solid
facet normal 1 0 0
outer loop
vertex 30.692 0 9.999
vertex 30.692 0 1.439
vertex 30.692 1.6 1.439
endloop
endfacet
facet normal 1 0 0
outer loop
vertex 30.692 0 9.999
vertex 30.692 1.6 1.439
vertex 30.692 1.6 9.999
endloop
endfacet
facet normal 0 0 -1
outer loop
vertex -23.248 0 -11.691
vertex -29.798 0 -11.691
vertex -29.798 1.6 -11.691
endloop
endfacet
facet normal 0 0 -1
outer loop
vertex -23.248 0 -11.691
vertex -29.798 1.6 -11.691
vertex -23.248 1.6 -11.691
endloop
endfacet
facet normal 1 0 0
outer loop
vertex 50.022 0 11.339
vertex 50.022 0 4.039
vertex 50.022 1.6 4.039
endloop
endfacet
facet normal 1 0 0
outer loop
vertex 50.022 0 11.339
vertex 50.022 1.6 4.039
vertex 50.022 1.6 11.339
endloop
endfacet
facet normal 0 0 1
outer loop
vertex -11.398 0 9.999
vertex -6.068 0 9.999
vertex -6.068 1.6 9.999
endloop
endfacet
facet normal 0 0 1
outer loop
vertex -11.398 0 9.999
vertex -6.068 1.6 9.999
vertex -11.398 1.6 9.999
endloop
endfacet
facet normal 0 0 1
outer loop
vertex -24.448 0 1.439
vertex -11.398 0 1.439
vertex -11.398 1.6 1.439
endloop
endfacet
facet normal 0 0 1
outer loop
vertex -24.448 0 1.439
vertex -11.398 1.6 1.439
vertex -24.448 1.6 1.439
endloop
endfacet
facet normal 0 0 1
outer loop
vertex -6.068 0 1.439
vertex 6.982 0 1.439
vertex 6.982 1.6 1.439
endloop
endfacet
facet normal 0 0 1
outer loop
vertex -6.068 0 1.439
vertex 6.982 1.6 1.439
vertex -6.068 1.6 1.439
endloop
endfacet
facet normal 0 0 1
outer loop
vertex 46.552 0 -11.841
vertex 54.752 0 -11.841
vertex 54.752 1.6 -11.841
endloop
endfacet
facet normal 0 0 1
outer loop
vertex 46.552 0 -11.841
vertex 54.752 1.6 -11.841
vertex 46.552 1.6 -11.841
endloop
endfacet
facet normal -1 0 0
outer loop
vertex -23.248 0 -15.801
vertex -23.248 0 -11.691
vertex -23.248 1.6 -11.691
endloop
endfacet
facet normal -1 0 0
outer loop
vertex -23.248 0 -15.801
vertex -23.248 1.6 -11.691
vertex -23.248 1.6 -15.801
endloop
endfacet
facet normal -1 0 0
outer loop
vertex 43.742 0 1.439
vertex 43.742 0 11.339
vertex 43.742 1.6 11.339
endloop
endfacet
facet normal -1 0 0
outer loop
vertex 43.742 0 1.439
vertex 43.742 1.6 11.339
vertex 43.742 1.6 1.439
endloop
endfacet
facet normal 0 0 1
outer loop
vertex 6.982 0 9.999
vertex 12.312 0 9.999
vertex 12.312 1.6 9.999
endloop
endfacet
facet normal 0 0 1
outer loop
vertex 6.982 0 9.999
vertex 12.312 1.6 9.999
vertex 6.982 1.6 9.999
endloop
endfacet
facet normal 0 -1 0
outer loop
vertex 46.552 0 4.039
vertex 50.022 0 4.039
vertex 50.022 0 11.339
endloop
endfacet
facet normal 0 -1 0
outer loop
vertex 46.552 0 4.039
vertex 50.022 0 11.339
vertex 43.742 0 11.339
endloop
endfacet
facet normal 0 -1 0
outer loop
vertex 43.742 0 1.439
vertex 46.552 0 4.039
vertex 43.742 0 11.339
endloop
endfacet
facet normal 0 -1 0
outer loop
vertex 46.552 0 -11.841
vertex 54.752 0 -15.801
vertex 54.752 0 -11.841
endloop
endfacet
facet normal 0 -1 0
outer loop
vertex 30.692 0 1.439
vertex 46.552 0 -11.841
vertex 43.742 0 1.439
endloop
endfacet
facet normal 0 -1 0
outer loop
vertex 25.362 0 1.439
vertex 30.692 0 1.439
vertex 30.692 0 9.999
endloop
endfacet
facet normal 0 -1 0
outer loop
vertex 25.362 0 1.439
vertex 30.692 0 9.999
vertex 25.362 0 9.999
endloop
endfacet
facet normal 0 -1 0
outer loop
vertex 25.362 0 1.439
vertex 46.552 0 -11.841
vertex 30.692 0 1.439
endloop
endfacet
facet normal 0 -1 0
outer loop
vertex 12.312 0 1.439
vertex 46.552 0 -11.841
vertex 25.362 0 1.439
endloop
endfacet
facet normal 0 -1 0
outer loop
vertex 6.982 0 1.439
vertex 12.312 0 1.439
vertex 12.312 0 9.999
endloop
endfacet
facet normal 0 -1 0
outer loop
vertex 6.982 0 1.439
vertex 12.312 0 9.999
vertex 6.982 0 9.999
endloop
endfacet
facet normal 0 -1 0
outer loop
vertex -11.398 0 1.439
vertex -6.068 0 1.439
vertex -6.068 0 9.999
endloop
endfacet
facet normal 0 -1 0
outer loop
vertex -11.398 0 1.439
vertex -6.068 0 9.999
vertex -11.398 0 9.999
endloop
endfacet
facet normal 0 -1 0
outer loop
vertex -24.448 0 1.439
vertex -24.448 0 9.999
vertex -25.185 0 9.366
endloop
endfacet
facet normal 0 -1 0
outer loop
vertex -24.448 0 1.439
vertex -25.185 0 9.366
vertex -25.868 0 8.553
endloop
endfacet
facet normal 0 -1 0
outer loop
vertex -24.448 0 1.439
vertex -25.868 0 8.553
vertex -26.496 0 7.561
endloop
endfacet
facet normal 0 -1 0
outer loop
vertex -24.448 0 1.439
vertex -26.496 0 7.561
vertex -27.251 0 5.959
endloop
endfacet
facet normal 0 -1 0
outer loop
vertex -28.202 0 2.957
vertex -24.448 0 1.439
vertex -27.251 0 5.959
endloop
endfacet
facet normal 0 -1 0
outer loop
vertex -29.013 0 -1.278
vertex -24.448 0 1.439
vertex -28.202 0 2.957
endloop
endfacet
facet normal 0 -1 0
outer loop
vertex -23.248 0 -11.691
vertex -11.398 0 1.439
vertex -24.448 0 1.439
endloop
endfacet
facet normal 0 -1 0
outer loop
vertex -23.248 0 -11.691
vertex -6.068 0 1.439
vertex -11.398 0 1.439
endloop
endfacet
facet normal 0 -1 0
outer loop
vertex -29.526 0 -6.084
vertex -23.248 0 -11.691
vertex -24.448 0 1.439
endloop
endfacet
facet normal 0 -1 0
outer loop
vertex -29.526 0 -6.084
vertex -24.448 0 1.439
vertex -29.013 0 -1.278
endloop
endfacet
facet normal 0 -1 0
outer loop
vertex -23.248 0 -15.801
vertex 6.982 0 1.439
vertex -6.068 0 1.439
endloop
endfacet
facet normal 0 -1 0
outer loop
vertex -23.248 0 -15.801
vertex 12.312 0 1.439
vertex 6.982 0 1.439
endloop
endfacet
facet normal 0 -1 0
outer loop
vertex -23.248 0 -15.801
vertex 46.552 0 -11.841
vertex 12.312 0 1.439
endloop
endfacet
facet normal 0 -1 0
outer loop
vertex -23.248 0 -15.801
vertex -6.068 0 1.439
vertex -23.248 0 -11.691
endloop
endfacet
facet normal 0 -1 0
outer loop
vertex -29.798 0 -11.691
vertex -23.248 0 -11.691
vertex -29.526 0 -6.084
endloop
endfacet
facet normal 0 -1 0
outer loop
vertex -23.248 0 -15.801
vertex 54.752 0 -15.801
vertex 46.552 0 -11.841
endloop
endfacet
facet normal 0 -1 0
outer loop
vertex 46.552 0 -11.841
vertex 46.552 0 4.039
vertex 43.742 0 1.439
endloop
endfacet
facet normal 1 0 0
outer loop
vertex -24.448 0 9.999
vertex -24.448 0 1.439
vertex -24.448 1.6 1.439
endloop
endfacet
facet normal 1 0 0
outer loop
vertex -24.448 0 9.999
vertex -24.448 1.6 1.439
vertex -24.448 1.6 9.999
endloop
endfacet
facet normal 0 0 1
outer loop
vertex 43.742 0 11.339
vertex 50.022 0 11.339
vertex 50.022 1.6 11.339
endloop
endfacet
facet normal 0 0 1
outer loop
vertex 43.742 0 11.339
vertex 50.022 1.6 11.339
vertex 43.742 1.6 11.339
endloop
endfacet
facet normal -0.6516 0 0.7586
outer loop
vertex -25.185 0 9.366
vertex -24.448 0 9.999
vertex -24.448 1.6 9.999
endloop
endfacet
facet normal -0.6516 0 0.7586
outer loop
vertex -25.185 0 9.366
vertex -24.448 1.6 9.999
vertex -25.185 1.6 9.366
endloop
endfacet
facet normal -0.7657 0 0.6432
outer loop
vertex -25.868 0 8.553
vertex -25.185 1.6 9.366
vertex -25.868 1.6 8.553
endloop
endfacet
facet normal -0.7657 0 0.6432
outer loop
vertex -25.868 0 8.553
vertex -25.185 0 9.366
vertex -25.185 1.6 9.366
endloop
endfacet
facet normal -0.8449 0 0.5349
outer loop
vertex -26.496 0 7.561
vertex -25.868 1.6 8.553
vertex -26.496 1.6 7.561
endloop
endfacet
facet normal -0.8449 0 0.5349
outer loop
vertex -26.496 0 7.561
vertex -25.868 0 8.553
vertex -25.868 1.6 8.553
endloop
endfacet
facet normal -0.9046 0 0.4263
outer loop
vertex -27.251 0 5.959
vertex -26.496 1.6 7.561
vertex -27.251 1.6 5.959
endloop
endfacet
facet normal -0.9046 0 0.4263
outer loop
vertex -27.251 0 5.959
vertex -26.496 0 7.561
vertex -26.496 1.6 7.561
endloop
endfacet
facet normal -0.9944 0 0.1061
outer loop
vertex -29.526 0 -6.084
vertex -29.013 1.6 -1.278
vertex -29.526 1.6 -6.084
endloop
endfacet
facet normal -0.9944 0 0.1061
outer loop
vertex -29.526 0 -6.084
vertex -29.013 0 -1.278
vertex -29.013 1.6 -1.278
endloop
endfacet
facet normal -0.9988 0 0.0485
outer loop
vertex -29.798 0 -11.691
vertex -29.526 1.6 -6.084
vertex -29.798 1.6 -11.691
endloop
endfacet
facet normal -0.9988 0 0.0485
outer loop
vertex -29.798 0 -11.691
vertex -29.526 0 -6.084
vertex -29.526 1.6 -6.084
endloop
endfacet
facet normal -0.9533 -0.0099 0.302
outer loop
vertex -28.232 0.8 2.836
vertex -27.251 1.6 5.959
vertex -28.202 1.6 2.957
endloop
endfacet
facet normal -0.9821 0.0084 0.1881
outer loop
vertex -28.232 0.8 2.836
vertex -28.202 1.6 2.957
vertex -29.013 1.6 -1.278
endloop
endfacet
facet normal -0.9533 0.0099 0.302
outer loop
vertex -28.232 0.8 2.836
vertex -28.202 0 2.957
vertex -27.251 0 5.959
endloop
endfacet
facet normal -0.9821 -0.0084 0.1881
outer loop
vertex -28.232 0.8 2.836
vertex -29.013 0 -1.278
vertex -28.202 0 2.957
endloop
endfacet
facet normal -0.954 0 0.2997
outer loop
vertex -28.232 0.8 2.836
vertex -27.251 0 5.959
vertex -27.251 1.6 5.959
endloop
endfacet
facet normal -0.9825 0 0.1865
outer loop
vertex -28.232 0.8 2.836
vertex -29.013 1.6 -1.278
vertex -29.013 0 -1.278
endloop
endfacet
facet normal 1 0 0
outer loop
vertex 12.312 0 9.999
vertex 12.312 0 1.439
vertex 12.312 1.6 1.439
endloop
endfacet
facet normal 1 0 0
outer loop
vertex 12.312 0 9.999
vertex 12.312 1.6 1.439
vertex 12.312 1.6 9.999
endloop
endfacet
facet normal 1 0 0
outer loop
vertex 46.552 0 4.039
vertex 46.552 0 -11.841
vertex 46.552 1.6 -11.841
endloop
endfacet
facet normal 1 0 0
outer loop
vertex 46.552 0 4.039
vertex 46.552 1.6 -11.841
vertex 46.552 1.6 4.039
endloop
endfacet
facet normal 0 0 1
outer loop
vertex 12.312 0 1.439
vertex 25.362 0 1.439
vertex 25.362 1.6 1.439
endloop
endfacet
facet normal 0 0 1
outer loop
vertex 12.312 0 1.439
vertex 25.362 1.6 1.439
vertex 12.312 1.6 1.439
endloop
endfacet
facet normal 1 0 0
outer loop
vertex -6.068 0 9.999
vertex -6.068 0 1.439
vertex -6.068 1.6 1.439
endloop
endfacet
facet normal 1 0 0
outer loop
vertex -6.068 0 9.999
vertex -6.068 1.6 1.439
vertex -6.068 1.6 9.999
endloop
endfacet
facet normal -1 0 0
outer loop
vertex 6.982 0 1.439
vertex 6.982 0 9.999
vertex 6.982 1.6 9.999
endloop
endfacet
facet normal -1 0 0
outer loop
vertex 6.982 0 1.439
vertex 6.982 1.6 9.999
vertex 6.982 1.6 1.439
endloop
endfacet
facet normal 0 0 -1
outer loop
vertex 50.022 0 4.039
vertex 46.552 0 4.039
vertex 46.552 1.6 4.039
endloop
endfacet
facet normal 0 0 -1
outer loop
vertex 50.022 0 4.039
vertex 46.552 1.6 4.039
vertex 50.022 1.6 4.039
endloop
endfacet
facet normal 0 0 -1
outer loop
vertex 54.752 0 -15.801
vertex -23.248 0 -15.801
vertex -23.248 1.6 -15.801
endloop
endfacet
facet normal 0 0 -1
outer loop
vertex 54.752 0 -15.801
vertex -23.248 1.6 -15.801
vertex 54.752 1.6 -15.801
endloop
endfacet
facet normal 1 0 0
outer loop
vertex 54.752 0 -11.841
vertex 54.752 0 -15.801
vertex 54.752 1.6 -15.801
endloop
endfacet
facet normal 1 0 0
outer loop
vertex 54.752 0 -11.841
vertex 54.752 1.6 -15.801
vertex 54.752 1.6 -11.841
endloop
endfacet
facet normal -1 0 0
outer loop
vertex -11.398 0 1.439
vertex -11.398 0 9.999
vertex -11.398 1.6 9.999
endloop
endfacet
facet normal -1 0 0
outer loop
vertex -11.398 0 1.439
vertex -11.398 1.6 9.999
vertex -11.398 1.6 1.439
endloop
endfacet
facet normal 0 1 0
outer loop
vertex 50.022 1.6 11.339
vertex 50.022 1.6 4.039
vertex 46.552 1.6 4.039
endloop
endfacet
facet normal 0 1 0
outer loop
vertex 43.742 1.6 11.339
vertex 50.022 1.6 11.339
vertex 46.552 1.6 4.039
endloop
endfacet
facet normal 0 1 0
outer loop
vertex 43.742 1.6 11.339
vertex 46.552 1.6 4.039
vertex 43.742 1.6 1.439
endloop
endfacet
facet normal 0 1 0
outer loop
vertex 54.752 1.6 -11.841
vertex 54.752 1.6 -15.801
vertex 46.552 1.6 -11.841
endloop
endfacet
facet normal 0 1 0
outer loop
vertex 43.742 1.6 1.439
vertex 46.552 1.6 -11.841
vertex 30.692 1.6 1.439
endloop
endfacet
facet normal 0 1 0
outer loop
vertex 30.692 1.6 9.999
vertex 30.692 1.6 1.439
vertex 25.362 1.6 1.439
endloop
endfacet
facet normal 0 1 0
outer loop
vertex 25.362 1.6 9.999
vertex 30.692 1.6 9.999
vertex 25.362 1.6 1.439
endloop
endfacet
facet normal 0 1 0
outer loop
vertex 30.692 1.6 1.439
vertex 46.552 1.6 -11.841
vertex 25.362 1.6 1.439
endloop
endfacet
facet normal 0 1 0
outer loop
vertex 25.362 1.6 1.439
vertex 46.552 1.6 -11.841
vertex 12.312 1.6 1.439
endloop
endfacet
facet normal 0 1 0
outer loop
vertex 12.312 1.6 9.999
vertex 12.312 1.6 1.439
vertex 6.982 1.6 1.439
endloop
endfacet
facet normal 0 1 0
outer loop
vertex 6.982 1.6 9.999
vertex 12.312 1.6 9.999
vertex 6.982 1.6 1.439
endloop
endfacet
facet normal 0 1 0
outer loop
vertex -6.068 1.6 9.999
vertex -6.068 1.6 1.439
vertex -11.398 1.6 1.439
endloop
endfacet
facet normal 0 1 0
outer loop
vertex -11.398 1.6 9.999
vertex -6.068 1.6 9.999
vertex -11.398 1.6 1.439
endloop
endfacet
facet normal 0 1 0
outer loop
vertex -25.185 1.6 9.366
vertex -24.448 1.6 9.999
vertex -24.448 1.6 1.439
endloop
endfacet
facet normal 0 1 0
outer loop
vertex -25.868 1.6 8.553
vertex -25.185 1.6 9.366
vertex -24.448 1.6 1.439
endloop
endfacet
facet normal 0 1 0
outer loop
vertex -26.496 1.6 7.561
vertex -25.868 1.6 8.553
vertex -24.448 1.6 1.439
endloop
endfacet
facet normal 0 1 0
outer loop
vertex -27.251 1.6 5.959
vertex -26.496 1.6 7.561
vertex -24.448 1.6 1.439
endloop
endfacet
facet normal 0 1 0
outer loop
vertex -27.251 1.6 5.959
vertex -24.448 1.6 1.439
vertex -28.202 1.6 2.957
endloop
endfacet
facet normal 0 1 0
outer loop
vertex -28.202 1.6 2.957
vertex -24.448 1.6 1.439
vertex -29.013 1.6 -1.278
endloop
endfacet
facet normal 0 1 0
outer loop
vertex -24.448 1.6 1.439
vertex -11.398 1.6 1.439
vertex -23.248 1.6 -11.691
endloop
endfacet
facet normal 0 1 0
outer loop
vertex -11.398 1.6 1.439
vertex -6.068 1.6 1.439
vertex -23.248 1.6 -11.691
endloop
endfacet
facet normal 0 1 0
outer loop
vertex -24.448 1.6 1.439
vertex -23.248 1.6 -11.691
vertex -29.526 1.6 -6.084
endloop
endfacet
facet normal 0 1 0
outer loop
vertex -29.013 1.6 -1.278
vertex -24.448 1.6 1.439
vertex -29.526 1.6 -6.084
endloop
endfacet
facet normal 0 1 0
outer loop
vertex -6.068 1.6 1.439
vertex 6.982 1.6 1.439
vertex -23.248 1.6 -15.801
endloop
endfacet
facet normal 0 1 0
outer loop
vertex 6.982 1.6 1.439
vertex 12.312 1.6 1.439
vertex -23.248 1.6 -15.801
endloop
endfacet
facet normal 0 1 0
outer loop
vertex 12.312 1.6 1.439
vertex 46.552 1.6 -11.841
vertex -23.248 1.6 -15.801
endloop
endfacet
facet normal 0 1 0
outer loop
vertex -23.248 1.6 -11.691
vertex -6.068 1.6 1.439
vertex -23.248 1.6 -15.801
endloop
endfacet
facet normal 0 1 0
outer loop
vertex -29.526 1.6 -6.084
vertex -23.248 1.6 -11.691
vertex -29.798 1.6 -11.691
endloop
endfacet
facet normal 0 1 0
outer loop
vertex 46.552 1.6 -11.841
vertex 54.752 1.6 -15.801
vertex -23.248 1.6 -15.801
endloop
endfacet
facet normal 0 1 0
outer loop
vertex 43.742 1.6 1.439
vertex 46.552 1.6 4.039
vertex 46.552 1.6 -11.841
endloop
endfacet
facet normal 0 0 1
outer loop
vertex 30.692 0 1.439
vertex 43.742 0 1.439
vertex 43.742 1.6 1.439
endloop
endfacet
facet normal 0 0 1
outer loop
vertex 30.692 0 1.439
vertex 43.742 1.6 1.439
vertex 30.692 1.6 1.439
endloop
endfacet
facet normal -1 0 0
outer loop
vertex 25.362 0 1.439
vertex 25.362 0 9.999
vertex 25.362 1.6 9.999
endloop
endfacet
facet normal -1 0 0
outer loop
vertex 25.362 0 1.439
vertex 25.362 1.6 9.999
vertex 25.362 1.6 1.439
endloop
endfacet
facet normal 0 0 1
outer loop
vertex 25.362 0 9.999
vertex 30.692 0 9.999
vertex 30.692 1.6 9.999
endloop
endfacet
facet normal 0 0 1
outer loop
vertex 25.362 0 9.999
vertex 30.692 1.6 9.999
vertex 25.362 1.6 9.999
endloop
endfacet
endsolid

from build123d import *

# Parameters (mm, degrees)
BOSS_EXTRUDE1_DEPTH = 1.6


with BuildPart() as part:
    # Sketch1 → Boss-Extrude1 (new body)
    with BuildSketch(Plane(origin=(0, 0, 0), x_dir=(1, 0, 0), z_dir=(0, 1, 0))):
        with BuildLine():
            Line((-23.247910864, 15.801225627), (54.752089136, 15.801225627))
            Line((54.752089136, 15.801225627), (54.752089136, 11.841225627))
            Line((54.752089136, 11.841225627), (46.552089136, 11.841225627))
            Line((46.552089136, 11.841225627), (46.552089136, -4.038774373))
            Line((46.552089136, -4.038774373), (50.022089136, -4.038774373))
            Line((50.022089136, -4.038774373), (50.022089136, -11.338774373))
            Line((50.022089136, -11.338774373), (43.742089136, -11.338774373))
            Line((43.742089136, -11.338774373), (43.742089136, -1.438774373))
            Line((43.742089136, -1.438774373), (30.692089136, -1.438774373))
            Line((30.692089136, -1.438774373), (30.692089136, -9.998774373))
            Line((30.692089136, -9.998774373), (25.362089136, -9.998774373))
            Line((25.362089136, -9.998774373), (25.362089136, -1.438774373))
            Line((25.362089136, -1.438774373), (12.312089136, -1.438774373))
            Line((12.312089136, -1.438774373), (12.312089136, -9.998774373))
            Line((12.312089136, -9.998774373), (6.982089136, -9.998774373))
            Line((6.982089136, -9.998774373), (6.982089136, -1.438774373))
            Line((6.982089136, -1.438774373), (-6.067910864, -1.438774373))
            Line((-6.067910864, -1.438774373), (-6.067910864, -9.998774373))
            Line((-6.067910864, -9.998774373), (-11.397910864, -9.998774373))
            Line((-11.397910864, -9.998774373), (-11.397910864, -1.438774373))
            Line((-11.397910864, -1.438774373), (-24.447910864, -1.438774373))
            Line((-24.447910864, -1.438774373), (-24.447910864, -9.998774373))
            add(Edge.make_bspline(
                [(-24.447910864, -9.998774373), (-29.341121858, -6.518559079), (-29.797910864, 11.691225627)],
                knots=[0, 0, 0, 1, 1, 1], degree=2))
            Line((-29.797910864, 11.691225627), (-23.247910864, 11.691225627))
            Line((-23.247910864, 11.691225627), (-23.247910864, 15.801225627))
        make_face()
    extrude(amount=BOSS_EXTRUDE1_DEPTH)


solid = part.part
